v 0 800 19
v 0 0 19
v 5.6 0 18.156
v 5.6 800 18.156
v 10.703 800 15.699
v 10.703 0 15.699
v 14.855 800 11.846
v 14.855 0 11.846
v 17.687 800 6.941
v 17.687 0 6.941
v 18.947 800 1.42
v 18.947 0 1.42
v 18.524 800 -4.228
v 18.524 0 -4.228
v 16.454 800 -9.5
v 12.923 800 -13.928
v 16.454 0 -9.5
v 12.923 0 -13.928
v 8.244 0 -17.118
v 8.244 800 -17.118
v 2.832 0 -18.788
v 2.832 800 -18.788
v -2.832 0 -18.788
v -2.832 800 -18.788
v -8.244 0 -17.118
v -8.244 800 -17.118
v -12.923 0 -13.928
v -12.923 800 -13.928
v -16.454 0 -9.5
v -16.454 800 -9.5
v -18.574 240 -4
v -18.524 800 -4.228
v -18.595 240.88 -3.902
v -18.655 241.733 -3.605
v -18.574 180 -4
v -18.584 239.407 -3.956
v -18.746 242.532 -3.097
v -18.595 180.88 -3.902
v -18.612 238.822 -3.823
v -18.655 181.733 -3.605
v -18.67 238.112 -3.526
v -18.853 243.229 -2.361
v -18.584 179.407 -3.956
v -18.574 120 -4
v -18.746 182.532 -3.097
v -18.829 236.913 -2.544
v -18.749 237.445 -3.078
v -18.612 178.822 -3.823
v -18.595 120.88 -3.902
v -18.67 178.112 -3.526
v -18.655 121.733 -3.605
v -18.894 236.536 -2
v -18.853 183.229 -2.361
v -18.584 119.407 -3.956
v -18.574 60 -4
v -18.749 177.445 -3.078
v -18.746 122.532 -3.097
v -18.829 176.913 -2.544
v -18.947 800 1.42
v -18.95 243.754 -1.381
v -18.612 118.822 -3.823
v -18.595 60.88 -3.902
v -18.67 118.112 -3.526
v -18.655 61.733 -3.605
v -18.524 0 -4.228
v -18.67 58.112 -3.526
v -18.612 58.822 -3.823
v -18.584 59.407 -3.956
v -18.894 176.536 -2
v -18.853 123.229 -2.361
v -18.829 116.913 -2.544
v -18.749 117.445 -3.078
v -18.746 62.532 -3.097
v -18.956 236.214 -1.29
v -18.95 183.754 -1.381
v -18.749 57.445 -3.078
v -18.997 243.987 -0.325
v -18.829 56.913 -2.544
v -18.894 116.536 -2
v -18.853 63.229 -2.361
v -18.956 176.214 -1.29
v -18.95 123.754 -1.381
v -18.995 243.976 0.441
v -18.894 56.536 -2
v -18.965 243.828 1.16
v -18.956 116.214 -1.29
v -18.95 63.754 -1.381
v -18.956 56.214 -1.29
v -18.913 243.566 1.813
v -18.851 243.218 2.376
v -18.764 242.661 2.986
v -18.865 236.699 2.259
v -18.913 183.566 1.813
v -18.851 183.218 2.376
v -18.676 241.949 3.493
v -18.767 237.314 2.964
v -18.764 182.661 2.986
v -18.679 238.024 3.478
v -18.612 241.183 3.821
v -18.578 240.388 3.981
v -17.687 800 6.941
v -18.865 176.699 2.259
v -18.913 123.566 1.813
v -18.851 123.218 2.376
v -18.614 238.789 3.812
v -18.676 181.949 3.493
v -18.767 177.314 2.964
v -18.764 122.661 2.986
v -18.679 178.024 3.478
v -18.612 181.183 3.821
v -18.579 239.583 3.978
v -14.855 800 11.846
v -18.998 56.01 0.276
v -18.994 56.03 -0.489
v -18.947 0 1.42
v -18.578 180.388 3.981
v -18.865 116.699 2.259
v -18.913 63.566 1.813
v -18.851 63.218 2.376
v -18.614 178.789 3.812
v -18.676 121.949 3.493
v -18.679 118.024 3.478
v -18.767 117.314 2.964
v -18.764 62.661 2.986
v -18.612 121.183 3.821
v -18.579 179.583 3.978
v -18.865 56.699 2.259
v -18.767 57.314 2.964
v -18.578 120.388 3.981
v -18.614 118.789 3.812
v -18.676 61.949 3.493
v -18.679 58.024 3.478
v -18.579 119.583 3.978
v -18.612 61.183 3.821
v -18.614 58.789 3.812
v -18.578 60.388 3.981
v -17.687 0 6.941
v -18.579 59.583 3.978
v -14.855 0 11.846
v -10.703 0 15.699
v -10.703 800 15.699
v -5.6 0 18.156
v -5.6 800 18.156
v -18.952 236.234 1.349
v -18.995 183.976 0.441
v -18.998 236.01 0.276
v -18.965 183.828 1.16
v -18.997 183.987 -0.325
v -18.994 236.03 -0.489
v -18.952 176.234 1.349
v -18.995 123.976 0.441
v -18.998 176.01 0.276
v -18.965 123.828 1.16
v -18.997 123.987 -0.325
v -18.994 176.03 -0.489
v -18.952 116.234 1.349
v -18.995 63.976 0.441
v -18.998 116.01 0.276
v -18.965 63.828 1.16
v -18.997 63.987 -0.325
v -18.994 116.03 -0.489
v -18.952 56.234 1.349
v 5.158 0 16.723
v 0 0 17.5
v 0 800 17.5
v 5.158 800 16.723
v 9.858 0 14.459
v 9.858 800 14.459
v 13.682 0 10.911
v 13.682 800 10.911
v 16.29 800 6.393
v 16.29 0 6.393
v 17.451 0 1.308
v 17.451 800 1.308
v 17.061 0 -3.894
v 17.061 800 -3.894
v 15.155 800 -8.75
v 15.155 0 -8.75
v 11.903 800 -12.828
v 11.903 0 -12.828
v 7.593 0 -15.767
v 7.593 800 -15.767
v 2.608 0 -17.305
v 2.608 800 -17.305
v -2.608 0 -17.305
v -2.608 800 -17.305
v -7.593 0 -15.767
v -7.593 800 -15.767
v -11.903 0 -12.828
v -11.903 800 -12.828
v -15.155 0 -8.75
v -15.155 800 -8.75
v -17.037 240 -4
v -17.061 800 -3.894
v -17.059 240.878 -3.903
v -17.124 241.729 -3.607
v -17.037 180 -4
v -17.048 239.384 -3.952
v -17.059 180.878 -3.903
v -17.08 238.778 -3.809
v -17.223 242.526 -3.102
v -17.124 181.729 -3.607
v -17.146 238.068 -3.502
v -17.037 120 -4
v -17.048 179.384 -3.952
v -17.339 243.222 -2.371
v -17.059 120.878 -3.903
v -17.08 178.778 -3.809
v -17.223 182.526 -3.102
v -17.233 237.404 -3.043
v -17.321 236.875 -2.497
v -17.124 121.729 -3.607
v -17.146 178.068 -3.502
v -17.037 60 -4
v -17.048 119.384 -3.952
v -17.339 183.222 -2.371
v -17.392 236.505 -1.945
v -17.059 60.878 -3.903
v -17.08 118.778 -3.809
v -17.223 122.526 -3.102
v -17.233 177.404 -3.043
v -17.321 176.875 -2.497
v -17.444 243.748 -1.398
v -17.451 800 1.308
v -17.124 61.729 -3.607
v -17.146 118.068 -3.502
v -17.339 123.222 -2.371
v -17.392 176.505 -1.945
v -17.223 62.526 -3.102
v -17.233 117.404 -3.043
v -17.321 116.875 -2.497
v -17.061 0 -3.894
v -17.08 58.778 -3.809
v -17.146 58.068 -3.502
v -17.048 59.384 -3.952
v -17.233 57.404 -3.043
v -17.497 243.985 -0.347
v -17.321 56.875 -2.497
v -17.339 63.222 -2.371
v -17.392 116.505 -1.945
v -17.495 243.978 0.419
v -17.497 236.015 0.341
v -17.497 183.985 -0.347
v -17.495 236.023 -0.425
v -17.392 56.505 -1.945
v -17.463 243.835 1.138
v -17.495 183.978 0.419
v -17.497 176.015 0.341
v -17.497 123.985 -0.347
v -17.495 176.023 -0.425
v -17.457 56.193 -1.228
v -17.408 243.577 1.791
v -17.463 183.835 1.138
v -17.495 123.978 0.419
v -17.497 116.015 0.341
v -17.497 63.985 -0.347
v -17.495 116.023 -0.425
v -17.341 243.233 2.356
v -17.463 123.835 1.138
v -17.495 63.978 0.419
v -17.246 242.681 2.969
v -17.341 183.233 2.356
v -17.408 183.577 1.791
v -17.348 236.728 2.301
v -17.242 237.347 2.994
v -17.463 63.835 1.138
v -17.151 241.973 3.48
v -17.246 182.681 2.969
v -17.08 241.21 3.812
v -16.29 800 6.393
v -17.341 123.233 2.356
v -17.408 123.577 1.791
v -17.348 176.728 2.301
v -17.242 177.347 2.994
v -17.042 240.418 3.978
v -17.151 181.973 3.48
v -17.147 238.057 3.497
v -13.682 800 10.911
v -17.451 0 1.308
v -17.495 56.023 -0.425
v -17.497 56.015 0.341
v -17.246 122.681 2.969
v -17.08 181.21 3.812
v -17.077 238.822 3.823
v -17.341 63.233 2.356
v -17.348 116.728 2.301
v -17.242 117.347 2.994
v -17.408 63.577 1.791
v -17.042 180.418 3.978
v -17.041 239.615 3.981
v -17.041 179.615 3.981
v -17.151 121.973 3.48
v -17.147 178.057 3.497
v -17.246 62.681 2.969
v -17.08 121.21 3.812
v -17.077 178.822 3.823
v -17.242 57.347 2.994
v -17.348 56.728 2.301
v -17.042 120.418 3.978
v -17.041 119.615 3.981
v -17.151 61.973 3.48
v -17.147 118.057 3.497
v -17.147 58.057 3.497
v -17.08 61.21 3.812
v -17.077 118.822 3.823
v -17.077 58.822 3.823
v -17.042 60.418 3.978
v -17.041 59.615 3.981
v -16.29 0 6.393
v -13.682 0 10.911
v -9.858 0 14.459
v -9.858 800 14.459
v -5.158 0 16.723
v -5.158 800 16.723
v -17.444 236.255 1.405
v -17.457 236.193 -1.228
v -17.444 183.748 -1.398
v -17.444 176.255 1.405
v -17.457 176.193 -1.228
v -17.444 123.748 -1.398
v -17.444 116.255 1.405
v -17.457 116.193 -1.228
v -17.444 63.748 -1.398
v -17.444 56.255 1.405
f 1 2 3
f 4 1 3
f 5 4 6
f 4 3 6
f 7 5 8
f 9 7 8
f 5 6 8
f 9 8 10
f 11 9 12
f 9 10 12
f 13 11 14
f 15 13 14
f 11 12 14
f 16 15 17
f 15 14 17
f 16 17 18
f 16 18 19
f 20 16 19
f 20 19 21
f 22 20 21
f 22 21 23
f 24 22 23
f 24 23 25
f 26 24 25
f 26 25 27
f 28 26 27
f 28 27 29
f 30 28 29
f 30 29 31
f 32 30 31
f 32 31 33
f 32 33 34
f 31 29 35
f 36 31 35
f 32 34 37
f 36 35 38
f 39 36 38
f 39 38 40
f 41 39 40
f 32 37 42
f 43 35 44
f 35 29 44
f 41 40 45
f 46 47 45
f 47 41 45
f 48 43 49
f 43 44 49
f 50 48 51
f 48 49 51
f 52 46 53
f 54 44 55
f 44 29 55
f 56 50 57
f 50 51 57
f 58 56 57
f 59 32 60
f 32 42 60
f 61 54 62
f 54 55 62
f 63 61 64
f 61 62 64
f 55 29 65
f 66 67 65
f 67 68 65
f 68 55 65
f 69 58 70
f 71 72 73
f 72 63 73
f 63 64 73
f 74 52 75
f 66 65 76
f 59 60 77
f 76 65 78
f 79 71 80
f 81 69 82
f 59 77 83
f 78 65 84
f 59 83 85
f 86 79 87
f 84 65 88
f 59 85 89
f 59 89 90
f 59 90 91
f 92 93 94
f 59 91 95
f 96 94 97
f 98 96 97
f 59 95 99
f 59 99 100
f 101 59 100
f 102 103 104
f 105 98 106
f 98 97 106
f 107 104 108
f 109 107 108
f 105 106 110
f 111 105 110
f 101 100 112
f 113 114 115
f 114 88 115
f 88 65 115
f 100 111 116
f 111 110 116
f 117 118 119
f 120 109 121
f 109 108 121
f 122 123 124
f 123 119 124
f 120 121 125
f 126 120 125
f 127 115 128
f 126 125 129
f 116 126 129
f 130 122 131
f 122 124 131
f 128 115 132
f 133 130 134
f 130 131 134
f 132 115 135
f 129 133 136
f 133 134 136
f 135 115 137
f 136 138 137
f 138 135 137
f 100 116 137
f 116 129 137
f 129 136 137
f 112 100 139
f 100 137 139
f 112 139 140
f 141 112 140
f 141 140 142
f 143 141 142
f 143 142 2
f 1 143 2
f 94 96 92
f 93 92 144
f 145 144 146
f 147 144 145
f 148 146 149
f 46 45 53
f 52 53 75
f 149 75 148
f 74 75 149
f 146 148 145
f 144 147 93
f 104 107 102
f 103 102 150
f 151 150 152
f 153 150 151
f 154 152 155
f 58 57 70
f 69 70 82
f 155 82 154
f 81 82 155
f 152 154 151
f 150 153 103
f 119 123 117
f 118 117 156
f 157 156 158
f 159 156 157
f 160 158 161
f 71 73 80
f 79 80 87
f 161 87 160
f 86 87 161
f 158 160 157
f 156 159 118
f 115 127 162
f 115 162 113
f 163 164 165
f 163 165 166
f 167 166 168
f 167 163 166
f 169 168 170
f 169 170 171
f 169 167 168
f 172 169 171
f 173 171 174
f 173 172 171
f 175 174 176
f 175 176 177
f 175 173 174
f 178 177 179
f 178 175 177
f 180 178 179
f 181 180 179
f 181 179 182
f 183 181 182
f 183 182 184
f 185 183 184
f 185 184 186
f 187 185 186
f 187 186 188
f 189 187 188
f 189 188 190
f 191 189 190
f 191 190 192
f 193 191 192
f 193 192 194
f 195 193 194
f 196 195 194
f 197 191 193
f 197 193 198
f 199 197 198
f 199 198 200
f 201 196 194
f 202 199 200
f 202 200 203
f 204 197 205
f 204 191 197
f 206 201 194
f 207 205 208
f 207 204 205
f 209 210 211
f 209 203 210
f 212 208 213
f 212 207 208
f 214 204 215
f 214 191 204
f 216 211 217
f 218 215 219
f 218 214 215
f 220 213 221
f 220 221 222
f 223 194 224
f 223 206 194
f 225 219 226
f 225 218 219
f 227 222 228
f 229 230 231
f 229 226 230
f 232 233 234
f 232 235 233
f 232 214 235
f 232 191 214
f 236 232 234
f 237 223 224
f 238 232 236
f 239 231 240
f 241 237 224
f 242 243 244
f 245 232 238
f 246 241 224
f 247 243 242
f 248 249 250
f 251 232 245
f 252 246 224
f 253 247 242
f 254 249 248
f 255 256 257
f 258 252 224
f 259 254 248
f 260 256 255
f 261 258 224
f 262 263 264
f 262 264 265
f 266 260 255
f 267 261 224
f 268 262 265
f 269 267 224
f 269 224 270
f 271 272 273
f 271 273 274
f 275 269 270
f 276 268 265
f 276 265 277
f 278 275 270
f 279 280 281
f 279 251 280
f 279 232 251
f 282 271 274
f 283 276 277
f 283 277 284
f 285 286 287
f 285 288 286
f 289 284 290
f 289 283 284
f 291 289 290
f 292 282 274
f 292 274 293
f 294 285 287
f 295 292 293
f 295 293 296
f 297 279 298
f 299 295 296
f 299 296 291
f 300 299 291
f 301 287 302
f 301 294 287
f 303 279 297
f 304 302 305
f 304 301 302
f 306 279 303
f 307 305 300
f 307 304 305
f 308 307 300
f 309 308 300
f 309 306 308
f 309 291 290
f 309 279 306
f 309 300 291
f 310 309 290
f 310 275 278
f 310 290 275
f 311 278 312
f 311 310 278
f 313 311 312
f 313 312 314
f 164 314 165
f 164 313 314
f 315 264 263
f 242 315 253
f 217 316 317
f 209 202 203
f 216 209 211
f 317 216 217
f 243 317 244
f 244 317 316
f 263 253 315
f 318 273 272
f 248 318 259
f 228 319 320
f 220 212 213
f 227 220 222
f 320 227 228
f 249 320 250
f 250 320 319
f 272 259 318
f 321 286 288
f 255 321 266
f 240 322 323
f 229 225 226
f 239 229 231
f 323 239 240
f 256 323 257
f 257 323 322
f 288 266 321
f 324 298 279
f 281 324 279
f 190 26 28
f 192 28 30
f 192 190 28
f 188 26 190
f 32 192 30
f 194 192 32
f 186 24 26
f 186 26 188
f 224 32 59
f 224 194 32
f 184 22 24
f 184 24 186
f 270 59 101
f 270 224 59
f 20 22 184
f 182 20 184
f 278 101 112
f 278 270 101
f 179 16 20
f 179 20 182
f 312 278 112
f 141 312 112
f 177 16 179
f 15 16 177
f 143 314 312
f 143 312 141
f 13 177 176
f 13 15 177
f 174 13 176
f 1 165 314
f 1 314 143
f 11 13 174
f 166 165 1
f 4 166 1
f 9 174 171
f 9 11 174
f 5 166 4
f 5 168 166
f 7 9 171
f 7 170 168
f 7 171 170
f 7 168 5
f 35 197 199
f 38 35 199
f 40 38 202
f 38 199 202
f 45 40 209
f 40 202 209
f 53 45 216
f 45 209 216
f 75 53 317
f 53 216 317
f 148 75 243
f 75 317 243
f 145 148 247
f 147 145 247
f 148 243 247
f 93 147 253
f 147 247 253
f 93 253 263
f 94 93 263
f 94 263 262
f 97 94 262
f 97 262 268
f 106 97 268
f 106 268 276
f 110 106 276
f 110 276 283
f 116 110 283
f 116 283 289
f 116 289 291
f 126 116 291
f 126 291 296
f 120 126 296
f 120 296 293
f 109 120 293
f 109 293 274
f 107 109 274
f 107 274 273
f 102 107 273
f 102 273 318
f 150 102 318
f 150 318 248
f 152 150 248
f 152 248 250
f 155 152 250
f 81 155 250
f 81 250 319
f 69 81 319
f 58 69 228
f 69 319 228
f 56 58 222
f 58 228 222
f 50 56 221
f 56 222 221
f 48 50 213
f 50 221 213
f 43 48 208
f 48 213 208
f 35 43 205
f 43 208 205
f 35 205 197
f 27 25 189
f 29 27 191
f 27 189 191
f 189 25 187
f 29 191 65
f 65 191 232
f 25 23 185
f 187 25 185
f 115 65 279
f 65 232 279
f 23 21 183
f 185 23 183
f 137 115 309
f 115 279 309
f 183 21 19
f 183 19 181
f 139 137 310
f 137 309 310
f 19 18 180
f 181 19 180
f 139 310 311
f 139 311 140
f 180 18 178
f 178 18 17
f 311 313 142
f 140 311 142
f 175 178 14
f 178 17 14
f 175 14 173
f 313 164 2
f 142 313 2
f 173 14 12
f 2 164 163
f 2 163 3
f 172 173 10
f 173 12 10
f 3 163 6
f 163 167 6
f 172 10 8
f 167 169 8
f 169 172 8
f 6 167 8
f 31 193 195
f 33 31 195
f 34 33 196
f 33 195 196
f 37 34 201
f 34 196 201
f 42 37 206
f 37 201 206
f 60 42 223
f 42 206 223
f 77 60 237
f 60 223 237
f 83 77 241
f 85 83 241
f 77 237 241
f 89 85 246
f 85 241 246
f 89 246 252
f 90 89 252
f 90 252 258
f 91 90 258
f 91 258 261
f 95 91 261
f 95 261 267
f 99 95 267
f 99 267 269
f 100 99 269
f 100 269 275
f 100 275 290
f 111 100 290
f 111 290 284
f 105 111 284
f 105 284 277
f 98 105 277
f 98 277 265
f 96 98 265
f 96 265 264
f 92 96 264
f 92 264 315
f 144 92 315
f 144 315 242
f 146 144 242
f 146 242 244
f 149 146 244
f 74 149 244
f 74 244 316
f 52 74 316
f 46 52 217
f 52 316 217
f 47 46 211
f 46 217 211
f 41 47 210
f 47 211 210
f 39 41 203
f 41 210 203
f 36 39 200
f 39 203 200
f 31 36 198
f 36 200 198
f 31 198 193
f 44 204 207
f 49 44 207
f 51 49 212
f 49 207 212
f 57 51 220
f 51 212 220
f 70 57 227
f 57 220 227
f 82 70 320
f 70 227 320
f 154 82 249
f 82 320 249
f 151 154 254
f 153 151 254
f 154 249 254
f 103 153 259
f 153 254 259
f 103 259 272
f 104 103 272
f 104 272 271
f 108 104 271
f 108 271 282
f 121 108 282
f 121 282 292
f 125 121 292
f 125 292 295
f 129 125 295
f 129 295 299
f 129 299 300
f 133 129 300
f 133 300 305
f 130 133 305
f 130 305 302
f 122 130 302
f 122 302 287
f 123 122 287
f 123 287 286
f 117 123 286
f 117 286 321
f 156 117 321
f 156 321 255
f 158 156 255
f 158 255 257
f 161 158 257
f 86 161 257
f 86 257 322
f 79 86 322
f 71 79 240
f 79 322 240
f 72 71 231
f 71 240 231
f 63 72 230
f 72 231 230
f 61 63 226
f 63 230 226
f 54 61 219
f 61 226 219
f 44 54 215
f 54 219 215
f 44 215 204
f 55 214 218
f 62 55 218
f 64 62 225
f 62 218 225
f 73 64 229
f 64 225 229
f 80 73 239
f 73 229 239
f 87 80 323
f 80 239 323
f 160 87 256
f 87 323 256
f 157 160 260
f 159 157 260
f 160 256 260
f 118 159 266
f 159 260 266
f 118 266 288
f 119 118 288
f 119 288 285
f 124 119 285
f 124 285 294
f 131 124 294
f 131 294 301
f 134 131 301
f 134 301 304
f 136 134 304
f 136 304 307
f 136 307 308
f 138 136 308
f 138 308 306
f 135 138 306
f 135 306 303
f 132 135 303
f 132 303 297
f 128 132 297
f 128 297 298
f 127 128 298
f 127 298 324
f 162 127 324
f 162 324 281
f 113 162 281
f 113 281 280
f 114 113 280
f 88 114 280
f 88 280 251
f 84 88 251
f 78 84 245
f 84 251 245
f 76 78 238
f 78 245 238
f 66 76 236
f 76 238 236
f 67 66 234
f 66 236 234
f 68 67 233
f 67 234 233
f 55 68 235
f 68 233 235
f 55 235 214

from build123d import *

# Parameters (mm, degrees)
SKETCH_1_R          = 19
SKETCH_1_R_2        = 17.5
EXTRUDE_1_DEPTH     = 800
SKETCH_2_R          = 4
CUT_EXTRUDE_1_DEPTH = 50


with BuildPart() as part:
    # 草图1 → 凸台-拉伸1 (new body)
    with BuildSketch(Plane(origin=(0, 0, 0), x_dir=(1, 0, 0), z_dir=(0, 1, 0))):
        with Locations(Location((0, 0, 0), (0, 0, 270))):
            Circle(SKETCH_1_R)
        with Locations(Location((0, 0, 0), (0, 0, 270))):
            Circle(SKETCH_1_R_2, mode=Mode.SUBTRACT)
    extrude(amount=EXTRUDE_1_DEPTH)

    # 草图2 → 切除-拉伸1 (cut)
    with BuildSketch(Plane(origin=(0, 0, 0), x_dir=(0, 0, -1), z_dir=(1, 0, 0))):
        with Locations((0, 60)):
            Circle(SKETCH_2_R)
        with Locations((0, 120)):
            Circle(SKETCH_2_R)
        with Locations((0, 180)):
            Circle(SKETCH_2_R)
        with Locations((0, 240)):
            Circle(SKETCH_2_R)
    extrude(amount=-CUT_EXTRUDE_1_DEPTH, mode=Mode.SUBTRACT)


solid = part.part
